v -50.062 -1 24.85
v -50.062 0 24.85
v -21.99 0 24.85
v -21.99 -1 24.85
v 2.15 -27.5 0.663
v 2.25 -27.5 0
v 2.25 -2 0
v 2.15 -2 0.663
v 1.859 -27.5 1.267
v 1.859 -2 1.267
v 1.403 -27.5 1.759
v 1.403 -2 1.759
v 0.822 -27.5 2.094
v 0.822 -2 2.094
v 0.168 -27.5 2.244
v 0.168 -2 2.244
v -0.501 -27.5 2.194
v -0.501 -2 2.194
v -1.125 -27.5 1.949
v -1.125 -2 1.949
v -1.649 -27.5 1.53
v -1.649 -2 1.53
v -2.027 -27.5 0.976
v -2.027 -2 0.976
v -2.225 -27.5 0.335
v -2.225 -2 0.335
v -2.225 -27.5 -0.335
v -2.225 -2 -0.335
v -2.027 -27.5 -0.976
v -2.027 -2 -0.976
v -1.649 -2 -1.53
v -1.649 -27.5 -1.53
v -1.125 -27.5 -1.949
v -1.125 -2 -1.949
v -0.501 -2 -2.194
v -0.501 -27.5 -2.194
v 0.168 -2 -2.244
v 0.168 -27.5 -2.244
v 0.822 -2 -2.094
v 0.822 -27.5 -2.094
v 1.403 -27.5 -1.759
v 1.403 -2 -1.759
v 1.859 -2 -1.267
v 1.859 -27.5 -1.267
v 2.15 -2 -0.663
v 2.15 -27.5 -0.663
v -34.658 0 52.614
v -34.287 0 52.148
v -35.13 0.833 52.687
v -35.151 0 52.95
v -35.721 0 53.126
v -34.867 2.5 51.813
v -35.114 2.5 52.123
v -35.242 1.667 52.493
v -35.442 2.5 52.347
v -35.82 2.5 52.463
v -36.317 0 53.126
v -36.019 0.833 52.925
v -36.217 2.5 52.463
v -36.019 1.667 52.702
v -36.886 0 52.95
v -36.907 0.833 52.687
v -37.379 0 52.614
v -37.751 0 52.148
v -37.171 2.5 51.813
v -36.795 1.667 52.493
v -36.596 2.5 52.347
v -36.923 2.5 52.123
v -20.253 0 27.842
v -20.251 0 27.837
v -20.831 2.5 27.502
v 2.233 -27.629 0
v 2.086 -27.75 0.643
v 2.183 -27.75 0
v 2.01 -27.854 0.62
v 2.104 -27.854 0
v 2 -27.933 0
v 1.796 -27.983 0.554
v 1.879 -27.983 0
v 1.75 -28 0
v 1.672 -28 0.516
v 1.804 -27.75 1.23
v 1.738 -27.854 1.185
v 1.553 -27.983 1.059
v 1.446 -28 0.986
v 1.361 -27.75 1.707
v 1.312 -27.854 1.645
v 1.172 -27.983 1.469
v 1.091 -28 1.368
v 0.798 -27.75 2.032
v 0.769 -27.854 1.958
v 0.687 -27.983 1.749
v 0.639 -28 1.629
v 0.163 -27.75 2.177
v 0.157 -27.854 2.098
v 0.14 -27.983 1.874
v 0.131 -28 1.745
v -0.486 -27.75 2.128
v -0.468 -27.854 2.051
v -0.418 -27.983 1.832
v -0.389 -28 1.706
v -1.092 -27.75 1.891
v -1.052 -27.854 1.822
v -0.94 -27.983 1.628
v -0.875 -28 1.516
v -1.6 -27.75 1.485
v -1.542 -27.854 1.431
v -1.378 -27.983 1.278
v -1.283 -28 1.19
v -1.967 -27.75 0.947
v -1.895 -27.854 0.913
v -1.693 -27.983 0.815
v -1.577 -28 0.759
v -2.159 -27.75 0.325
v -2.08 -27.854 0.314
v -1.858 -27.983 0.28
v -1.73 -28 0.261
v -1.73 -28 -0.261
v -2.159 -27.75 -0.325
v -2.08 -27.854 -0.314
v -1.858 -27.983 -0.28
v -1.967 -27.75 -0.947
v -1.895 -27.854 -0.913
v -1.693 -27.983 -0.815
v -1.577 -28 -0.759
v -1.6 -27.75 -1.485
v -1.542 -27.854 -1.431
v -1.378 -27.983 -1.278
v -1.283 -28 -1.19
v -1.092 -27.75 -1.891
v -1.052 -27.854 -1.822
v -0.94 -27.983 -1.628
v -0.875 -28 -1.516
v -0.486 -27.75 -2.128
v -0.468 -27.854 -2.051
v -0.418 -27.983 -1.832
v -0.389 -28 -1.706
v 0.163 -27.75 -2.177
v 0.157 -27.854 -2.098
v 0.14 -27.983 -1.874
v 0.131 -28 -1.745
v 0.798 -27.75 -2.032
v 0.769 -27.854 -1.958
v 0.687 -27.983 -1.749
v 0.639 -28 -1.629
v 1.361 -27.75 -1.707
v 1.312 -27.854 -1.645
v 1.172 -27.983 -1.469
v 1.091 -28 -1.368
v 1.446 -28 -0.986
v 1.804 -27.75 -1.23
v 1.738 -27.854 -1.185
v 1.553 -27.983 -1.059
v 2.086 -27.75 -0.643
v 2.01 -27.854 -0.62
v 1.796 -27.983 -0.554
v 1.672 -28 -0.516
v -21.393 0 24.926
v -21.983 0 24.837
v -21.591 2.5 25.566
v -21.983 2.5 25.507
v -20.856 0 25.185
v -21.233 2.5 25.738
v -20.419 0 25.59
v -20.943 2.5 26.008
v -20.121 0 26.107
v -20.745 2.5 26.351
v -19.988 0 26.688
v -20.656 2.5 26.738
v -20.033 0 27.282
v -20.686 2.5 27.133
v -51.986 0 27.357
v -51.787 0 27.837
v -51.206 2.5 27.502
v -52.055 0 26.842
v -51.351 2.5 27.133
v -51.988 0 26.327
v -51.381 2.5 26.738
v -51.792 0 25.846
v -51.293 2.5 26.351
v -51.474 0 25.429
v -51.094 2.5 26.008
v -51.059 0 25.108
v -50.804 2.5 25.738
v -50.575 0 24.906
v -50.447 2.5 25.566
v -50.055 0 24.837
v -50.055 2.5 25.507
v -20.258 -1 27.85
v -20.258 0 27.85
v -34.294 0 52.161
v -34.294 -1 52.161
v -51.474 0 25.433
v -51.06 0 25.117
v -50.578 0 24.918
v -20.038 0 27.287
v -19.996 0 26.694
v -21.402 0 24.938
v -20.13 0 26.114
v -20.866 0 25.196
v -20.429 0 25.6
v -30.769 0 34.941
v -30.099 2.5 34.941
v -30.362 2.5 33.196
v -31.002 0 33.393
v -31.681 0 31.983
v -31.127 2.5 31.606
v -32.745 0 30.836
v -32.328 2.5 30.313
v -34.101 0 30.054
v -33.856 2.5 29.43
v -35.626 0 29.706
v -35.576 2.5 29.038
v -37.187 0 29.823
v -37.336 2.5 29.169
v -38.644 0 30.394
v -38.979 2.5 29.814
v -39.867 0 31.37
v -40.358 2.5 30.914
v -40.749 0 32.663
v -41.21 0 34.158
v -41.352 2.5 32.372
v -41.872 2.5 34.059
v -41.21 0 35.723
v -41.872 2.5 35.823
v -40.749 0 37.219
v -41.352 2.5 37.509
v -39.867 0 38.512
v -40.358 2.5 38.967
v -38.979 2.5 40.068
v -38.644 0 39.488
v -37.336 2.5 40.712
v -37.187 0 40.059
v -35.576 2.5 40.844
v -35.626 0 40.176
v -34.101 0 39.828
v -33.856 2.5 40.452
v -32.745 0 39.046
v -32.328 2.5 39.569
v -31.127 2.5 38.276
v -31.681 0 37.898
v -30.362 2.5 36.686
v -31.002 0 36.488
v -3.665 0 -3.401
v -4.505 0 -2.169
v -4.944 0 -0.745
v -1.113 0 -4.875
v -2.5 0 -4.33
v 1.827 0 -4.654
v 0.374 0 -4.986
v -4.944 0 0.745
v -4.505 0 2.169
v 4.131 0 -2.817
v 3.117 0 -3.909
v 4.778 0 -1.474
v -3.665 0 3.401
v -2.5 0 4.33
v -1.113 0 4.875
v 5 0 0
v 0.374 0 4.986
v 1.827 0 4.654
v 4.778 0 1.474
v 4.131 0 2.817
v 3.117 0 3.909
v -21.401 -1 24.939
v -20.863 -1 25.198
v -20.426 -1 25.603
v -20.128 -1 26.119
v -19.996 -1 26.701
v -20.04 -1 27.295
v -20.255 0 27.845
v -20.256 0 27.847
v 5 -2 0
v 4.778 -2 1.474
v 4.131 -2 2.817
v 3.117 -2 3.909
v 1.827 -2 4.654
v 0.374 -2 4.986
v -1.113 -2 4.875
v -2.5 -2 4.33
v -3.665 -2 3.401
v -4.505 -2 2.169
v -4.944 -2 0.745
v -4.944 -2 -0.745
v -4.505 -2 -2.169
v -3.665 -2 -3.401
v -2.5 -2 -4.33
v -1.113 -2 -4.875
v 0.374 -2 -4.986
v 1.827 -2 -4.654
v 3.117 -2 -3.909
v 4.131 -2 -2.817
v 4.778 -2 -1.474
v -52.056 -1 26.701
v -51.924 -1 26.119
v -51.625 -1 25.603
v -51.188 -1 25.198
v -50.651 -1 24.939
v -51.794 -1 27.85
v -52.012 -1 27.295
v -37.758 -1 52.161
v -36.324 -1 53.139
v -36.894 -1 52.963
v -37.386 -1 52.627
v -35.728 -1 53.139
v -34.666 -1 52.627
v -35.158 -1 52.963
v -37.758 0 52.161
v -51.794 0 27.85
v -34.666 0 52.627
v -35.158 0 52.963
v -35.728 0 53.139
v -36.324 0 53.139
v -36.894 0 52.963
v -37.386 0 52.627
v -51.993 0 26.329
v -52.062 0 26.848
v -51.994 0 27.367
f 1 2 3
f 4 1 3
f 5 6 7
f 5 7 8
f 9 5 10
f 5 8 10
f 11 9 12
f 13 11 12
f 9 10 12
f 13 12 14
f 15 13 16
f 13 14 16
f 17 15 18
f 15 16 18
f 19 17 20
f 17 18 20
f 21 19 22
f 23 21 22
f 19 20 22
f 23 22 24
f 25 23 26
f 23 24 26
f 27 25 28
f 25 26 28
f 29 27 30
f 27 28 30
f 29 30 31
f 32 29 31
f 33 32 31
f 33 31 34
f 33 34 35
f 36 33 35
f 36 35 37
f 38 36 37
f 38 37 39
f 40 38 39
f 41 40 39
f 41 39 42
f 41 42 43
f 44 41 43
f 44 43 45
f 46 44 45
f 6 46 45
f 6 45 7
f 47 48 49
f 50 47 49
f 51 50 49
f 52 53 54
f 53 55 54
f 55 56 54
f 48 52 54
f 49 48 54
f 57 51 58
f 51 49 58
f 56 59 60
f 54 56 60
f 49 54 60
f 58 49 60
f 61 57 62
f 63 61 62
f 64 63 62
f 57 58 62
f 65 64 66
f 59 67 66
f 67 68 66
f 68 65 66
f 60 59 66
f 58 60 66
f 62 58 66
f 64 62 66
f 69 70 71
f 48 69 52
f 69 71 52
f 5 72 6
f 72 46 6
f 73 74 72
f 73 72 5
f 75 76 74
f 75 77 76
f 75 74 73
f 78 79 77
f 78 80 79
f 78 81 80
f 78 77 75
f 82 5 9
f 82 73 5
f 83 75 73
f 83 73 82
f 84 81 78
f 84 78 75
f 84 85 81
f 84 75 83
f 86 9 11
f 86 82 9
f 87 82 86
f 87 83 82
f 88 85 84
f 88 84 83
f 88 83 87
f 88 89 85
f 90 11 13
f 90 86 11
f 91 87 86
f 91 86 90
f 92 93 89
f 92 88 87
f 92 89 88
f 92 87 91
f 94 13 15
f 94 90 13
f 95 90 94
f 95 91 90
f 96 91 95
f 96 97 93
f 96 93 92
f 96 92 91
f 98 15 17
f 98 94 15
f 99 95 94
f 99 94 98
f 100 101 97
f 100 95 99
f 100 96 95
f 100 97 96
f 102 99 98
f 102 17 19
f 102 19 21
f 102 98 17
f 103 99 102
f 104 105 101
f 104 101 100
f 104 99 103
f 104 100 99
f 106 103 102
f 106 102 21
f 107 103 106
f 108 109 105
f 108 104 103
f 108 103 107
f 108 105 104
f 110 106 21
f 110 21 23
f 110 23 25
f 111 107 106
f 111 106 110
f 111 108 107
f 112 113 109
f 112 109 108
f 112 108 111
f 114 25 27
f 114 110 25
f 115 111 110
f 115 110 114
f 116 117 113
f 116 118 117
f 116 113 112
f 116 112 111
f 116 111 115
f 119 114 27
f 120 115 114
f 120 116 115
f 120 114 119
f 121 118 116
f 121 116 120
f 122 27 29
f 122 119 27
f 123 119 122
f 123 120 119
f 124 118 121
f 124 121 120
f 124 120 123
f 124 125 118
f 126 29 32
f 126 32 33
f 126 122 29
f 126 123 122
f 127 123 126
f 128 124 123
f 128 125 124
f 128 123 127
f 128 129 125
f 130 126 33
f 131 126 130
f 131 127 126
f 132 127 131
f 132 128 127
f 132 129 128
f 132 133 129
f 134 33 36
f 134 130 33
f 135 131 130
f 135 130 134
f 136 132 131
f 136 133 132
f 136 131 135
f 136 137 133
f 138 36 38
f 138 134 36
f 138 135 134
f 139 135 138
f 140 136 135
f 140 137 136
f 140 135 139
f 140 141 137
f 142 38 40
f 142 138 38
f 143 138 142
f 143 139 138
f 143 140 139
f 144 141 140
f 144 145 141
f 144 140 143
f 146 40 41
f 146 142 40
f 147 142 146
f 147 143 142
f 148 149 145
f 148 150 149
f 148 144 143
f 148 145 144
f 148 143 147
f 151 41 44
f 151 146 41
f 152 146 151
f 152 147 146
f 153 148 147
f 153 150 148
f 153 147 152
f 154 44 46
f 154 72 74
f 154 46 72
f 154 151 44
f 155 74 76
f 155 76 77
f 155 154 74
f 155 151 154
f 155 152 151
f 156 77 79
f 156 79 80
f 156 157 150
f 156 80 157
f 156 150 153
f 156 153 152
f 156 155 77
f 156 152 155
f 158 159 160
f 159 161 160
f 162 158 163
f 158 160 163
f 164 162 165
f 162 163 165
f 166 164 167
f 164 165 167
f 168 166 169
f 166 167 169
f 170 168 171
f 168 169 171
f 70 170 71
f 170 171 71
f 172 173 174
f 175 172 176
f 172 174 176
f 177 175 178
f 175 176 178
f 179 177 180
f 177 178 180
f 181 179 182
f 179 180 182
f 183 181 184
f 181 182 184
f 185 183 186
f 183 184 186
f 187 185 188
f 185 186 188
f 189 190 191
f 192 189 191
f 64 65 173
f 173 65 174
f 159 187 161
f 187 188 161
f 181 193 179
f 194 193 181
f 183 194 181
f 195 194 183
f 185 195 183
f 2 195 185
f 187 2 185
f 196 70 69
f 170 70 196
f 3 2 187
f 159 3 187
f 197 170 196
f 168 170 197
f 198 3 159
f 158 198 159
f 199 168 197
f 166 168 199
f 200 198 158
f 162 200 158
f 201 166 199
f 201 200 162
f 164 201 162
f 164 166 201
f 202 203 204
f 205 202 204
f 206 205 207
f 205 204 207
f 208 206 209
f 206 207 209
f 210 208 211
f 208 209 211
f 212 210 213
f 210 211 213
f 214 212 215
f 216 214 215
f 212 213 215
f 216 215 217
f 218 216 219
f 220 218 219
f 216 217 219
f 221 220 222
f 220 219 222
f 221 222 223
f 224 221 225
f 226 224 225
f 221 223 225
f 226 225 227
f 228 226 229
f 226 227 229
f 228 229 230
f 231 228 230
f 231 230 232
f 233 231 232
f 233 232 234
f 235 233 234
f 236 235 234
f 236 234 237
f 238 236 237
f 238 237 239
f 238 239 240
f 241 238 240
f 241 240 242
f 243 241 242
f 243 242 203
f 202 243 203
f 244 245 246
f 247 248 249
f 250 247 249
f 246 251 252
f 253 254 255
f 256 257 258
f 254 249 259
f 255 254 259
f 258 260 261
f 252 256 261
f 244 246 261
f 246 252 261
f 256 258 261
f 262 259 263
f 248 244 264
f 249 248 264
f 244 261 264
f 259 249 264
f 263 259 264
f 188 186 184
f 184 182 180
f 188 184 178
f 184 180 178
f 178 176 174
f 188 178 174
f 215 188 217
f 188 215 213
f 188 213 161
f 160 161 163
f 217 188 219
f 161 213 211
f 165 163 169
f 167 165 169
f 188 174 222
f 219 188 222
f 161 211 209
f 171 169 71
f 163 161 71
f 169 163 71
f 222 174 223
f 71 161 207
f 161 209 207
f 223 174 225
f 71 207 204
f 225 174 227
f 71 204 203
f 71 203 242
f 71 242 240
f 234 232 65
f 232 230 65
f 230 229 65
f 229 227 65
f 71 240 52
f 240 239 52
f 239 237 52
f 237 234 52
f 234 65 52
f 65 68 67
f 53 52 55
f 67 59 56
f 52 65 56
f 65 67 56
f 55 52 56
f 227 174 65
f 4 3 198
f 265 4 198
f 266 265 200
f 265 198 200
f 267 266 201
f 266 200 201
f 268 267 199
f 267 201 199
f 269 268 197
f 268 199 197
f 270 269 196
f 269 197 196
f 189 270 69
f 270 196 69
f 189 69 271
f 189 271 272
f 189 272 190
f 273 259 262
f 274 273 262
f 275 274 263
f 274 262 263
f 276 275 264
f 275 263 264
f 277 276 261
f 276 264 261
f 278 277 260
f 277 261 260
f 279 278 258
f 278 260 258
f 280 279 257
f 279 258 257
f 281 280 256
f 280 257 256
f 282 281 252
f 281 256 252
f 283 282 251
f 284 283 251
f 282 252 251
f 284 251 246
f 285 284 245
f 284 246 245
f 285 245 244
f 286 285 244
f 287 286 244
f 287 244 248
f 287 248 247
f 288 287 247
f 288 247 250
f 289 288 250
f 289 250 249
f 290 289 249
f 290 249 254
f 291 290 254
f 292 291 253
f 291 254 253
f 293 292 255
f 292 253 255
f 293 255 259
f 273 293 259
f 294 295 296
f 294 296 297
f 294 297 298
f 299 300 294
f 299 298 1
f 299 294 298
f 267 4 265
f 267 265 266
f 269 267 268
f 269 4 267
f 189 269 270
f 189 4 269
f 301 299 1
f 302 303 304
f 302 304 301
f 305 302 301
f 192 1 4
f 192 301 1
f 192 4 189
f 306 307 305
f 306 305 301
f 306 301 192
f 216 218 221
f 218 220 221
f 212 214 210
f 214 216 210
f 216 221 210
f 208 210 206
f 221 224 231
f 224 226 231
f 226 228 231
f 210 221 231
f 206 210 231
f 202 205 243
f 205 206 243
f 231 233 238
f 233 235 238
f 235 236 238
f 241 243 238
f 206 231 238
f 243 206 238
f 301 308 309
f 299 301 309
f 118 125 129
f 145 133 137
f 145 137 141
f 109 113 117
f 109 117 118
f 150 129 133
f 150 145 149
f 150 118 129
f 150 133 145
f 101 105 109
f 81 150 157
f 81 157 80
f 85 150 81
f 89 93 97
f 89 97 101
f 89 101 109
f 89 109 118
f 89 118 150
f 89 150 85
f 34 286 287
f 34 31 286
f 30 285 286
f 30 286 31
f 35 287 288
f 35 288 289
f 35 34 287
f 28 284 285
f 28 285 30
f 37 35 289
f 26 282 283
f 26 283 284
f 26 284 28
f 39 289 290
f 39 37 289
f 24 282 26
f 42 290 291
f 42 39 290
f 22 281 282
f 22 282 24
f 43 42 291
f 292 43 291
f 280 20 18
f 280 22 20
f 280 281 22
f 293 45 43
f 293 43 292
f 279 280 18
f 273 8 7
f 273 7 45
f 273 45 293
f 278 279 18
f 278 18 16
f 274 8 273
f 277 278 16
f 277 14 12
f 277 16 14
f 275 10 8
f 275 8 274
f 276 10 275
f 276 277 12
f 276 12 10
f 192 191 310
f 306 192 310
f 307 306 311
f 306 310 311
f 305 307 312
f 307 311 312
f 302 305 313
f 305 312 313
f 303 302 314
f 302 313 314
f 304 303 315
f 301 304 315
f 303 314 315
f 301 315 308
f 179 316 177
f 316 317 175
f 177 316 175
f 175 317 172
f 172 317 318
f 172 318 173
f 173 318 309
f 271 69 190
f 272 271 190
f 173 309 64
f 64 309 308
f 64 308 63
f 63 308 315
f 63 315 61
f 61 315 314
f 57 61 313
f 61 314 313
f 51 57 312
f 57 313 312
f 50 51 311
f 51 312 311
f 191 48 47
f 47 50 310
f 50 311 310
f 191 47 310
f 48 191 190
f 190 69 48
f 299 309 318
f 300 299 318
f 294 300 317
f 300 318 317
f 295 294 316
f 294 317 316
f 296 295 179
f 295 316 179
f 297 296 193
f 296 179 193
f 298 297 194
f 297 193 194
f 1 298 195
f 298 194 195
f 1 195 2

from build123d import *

# Parameters (mm, degrees)
F0_R     = 2.25
F1_DEPTH = 28
F0_R_2   = 5
F2_DEPTH = 2
F3_R     = 0.5
F4_R     = 5.25
F5_DEPTH = 2.5
F5_TAPER = 15
F7_DEPTH = 1


with BuildPart() as f1:
    # F0 (on Front) → F1 (new body)
    with BuildSketch(Plane.XZ):
        Circle(F0_R)
    extrude(amount=F1_DEPTH)

    # F0 (on Front) → F2 (join)
    with BuildSketch(Plane.XZ):
        Circle(F0_R_2)
        Circle(F0_R, mode=Mode.SUBTRACT)
    extrude(amount=F2_DEPTH)

    # F3
    f3_edges = [f1.edges().sort_by_distance(p)[0] for p in [
        (-2.25, -28, 0),
    ]]
    fillet(f3_edges, radius=F3_R)


with BuildPart() as f5:
    # F4 (on Front) → F5 (new body)
    with BuildSketch(Plane.XZ):
        with BuildLine():
            Line((-20.2506759399, 27.8372983187), (-34.2865743248, 52.1481874512))
            ThreePointArc((-34.2865743248, 52.1481874512), (-36.0186251323, 53.1481874512), (-37.7506759399, 52.1481874512))
            Line((-37.7506759399, 52.1481874512), (-51.7865743248, 27.8372983187))
            ThreePointArc((-51.7865743248, 27.8372983187), (-51.7865743248, 25.8372983187), (-50.0545235172, 24.8372983187))
            Line((-50.0545235172, 24.8372983187), (-21.9827267475, 24.8372983187))
            ThreePointArc((-21.9827267475, 24.8372983187), (-20.2506759399, 25.8372983187), (-20.2506759399, 27.8372983187))
        make_face()
        with Locations((-36.0186251323, 34.9409280296)):
            Circle(F4_R, mode=Mode.SUBTRACT)
    extrude(amount=-F5_DEPTH, taper=F5_TAPER)

    # F6 (on Front) → F7 (join)
    with BuildSketch(Plane.XZ):
        with BuildLine():
            ThreePointArc((-34.2938764173, 52.1608777881), (-36.0259272249, 53.1608777881), (-37.7579780324, 52.1608777881))
            Line((-37.7579780324, 52.1608777881), (-51.7938764173, 27.8499886557))
            ThreePointArc((-51.7938764173, 27.8499886557), (-51.7938764173, 25.8499886557), (-50.0618256097, 24.8499886557))
            Line((-50.0618256097, 24.8499886557), (-21.99002884, 24.8499886557))
            ThreePointArc((-21.99002884, 24.8499886557), (-20.2579780324, 25.8499886557), (-20.2579780324, 27.8499886557))
            Line((-20.2579780324, 27.8499886557), (-34.2938764173, 52.1608777881))
        make_face()
    extrude(amount=F7_DEPTH)


solid = Compound([f1.part, f5.part])
